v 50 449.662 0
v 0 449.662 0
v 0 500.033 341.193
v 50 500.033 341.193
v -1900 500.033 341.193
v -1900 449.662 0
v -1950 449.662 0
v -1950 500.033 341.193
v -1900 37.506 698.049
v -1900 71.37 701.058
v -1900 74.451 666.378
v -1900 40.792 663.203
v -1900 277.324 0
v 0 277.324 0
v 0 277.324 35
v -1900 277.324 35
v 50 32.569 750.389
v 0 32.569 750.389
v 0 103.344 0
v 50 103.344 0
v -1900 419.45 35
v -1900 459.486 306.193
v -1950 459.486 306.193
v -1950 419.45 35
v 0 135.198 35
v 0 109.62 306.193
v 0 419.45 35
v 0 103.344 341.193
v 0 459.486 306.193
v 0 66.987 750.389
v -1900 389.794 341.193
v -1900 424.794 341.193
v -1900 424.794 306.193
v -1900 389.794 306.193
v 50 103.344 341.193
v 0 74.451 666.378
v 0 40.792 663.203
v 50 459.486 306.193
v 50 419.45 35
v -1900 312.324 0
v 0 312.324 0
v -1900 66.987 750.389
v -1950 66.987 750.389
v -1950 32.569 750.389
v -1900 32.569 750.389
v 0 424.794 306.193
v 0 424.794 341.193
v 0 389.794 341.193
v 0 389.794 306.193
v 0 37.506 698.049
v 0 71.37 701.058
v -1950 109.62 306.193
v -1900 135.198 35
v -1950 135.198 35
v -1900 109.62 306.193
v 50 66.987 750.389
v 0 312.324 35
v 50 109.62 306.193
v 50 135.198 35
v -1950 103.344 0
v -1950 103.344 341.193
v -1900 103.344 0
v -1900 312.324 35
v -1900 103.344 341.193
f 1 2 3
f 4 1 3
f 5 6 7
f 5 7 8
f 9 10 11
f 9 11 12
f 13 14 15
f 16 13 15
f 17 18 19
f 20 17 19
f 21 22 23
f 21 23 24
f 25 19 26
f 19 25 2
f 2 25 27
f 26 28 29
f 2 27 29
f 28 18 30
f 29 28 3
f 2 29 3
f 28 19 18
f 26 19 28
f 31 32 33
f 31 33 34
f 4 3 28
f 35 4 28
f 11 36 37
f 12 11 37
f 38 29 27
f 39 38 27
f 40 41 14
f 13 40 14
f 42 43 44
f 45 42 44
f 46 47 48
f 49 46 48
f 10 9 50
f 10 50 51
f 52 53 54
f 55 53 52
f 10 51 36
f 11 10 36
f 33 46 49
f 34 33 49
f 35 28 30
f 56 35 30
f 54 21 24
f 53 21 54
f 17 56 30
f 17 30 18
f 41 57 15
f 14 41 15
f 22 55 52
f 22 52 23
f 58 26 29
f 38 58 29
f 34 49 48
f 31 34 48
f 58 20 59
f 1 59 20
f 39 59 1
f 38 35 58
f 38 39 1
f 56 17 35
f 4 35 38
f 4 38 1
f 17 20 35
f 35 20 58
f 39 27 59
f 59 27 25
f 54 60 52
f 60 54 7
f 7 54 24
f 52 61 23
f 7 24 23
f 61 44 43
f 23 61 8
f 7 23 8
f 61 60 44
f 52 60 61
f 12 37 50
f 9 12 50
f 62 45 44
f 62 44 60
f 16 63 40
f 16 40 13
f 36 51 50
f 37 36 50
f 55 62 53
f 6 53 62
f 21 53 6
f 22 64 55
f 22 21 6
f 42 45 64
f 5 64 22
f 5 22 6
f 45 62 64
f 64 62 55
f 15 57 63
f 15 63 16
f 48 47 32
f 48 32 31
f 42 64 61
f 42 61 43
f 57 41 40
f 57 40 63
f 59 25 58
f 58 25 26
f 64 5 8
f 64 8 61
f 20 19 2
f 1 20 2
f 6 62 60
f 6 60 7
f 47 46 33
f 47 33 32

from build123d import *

# Parameters (mm, degrees)
F1_DEPTH = 50
F2_W     = 35
F2_H     = 35
F3_DEPTH = 950
F6_W     = 35
F6_H     = 35
F7_DEPTH = 1900


with BuildPart() as f1:
    # F0 (on Right) → F1 (new body)
    with BuildSketch(Plane.YZ):
        Polygon((66.98719, 750.389036), (32.568913, 750.389036), (103.343673, 0), (449.662176, 0), (500.032689, 341.19256), (103.343673, 341.19256), align=None)
        Polygon((419.449898, 35), (135.197895, 35), (109.619711, 306.19256), (459.486259, 306.19256), align=None, mode=Mode.SUBTRACT)
    extrude(amount=F1_DEPTH)


with BuildPart() as f3:
    # F2 (on face) → F3 (new body)
    with BuildSketch(Plane(origin=(0, 0, 0), x_dir=(0, -1, 0), z_dir=(-1, 0, 0))):
        with Locations((-302.052985, 323.69256)):
            Rectangle(F2_W, F2_H)
        with Locations((-294.823896, 17.5)):
            Rectangle(F2_W, F2_H)
    extrude(amount=F3_DEPTH)


with BuildPart() as f4_1:
    # F4: instance of F1
    add(f1.part.mirror(Plane(origin=(-950, 302.052985, 323.69256), x_dir=(0, -1, 0), z_dir=(-1, 0, 0))))


with BuildPart() as f7:
    # F6 (on face) → F7 (new body, through all)
    with BuildSketch(Plane(origin=(0, 0, 0), x_dir=(0, -1, 0), z_dir=(-1, 0, 0))):
        with Locations((-294.823896, 17.5)):
            Rectangle(F6_W, F6_H)
        Polygon((-37.505505, 698.048839), (-71.370207, 701.057666), (-74.451429, 666.378152), (-40.792029, 663.203484), align=None)
        with Locations((-407.29375, 323.69256)):
            Rectangle(F6_W, F6_H)
    extrude(amount=F7_DEPTH)


solid = Compound([f1.part, f4_1.part, f7.part])
